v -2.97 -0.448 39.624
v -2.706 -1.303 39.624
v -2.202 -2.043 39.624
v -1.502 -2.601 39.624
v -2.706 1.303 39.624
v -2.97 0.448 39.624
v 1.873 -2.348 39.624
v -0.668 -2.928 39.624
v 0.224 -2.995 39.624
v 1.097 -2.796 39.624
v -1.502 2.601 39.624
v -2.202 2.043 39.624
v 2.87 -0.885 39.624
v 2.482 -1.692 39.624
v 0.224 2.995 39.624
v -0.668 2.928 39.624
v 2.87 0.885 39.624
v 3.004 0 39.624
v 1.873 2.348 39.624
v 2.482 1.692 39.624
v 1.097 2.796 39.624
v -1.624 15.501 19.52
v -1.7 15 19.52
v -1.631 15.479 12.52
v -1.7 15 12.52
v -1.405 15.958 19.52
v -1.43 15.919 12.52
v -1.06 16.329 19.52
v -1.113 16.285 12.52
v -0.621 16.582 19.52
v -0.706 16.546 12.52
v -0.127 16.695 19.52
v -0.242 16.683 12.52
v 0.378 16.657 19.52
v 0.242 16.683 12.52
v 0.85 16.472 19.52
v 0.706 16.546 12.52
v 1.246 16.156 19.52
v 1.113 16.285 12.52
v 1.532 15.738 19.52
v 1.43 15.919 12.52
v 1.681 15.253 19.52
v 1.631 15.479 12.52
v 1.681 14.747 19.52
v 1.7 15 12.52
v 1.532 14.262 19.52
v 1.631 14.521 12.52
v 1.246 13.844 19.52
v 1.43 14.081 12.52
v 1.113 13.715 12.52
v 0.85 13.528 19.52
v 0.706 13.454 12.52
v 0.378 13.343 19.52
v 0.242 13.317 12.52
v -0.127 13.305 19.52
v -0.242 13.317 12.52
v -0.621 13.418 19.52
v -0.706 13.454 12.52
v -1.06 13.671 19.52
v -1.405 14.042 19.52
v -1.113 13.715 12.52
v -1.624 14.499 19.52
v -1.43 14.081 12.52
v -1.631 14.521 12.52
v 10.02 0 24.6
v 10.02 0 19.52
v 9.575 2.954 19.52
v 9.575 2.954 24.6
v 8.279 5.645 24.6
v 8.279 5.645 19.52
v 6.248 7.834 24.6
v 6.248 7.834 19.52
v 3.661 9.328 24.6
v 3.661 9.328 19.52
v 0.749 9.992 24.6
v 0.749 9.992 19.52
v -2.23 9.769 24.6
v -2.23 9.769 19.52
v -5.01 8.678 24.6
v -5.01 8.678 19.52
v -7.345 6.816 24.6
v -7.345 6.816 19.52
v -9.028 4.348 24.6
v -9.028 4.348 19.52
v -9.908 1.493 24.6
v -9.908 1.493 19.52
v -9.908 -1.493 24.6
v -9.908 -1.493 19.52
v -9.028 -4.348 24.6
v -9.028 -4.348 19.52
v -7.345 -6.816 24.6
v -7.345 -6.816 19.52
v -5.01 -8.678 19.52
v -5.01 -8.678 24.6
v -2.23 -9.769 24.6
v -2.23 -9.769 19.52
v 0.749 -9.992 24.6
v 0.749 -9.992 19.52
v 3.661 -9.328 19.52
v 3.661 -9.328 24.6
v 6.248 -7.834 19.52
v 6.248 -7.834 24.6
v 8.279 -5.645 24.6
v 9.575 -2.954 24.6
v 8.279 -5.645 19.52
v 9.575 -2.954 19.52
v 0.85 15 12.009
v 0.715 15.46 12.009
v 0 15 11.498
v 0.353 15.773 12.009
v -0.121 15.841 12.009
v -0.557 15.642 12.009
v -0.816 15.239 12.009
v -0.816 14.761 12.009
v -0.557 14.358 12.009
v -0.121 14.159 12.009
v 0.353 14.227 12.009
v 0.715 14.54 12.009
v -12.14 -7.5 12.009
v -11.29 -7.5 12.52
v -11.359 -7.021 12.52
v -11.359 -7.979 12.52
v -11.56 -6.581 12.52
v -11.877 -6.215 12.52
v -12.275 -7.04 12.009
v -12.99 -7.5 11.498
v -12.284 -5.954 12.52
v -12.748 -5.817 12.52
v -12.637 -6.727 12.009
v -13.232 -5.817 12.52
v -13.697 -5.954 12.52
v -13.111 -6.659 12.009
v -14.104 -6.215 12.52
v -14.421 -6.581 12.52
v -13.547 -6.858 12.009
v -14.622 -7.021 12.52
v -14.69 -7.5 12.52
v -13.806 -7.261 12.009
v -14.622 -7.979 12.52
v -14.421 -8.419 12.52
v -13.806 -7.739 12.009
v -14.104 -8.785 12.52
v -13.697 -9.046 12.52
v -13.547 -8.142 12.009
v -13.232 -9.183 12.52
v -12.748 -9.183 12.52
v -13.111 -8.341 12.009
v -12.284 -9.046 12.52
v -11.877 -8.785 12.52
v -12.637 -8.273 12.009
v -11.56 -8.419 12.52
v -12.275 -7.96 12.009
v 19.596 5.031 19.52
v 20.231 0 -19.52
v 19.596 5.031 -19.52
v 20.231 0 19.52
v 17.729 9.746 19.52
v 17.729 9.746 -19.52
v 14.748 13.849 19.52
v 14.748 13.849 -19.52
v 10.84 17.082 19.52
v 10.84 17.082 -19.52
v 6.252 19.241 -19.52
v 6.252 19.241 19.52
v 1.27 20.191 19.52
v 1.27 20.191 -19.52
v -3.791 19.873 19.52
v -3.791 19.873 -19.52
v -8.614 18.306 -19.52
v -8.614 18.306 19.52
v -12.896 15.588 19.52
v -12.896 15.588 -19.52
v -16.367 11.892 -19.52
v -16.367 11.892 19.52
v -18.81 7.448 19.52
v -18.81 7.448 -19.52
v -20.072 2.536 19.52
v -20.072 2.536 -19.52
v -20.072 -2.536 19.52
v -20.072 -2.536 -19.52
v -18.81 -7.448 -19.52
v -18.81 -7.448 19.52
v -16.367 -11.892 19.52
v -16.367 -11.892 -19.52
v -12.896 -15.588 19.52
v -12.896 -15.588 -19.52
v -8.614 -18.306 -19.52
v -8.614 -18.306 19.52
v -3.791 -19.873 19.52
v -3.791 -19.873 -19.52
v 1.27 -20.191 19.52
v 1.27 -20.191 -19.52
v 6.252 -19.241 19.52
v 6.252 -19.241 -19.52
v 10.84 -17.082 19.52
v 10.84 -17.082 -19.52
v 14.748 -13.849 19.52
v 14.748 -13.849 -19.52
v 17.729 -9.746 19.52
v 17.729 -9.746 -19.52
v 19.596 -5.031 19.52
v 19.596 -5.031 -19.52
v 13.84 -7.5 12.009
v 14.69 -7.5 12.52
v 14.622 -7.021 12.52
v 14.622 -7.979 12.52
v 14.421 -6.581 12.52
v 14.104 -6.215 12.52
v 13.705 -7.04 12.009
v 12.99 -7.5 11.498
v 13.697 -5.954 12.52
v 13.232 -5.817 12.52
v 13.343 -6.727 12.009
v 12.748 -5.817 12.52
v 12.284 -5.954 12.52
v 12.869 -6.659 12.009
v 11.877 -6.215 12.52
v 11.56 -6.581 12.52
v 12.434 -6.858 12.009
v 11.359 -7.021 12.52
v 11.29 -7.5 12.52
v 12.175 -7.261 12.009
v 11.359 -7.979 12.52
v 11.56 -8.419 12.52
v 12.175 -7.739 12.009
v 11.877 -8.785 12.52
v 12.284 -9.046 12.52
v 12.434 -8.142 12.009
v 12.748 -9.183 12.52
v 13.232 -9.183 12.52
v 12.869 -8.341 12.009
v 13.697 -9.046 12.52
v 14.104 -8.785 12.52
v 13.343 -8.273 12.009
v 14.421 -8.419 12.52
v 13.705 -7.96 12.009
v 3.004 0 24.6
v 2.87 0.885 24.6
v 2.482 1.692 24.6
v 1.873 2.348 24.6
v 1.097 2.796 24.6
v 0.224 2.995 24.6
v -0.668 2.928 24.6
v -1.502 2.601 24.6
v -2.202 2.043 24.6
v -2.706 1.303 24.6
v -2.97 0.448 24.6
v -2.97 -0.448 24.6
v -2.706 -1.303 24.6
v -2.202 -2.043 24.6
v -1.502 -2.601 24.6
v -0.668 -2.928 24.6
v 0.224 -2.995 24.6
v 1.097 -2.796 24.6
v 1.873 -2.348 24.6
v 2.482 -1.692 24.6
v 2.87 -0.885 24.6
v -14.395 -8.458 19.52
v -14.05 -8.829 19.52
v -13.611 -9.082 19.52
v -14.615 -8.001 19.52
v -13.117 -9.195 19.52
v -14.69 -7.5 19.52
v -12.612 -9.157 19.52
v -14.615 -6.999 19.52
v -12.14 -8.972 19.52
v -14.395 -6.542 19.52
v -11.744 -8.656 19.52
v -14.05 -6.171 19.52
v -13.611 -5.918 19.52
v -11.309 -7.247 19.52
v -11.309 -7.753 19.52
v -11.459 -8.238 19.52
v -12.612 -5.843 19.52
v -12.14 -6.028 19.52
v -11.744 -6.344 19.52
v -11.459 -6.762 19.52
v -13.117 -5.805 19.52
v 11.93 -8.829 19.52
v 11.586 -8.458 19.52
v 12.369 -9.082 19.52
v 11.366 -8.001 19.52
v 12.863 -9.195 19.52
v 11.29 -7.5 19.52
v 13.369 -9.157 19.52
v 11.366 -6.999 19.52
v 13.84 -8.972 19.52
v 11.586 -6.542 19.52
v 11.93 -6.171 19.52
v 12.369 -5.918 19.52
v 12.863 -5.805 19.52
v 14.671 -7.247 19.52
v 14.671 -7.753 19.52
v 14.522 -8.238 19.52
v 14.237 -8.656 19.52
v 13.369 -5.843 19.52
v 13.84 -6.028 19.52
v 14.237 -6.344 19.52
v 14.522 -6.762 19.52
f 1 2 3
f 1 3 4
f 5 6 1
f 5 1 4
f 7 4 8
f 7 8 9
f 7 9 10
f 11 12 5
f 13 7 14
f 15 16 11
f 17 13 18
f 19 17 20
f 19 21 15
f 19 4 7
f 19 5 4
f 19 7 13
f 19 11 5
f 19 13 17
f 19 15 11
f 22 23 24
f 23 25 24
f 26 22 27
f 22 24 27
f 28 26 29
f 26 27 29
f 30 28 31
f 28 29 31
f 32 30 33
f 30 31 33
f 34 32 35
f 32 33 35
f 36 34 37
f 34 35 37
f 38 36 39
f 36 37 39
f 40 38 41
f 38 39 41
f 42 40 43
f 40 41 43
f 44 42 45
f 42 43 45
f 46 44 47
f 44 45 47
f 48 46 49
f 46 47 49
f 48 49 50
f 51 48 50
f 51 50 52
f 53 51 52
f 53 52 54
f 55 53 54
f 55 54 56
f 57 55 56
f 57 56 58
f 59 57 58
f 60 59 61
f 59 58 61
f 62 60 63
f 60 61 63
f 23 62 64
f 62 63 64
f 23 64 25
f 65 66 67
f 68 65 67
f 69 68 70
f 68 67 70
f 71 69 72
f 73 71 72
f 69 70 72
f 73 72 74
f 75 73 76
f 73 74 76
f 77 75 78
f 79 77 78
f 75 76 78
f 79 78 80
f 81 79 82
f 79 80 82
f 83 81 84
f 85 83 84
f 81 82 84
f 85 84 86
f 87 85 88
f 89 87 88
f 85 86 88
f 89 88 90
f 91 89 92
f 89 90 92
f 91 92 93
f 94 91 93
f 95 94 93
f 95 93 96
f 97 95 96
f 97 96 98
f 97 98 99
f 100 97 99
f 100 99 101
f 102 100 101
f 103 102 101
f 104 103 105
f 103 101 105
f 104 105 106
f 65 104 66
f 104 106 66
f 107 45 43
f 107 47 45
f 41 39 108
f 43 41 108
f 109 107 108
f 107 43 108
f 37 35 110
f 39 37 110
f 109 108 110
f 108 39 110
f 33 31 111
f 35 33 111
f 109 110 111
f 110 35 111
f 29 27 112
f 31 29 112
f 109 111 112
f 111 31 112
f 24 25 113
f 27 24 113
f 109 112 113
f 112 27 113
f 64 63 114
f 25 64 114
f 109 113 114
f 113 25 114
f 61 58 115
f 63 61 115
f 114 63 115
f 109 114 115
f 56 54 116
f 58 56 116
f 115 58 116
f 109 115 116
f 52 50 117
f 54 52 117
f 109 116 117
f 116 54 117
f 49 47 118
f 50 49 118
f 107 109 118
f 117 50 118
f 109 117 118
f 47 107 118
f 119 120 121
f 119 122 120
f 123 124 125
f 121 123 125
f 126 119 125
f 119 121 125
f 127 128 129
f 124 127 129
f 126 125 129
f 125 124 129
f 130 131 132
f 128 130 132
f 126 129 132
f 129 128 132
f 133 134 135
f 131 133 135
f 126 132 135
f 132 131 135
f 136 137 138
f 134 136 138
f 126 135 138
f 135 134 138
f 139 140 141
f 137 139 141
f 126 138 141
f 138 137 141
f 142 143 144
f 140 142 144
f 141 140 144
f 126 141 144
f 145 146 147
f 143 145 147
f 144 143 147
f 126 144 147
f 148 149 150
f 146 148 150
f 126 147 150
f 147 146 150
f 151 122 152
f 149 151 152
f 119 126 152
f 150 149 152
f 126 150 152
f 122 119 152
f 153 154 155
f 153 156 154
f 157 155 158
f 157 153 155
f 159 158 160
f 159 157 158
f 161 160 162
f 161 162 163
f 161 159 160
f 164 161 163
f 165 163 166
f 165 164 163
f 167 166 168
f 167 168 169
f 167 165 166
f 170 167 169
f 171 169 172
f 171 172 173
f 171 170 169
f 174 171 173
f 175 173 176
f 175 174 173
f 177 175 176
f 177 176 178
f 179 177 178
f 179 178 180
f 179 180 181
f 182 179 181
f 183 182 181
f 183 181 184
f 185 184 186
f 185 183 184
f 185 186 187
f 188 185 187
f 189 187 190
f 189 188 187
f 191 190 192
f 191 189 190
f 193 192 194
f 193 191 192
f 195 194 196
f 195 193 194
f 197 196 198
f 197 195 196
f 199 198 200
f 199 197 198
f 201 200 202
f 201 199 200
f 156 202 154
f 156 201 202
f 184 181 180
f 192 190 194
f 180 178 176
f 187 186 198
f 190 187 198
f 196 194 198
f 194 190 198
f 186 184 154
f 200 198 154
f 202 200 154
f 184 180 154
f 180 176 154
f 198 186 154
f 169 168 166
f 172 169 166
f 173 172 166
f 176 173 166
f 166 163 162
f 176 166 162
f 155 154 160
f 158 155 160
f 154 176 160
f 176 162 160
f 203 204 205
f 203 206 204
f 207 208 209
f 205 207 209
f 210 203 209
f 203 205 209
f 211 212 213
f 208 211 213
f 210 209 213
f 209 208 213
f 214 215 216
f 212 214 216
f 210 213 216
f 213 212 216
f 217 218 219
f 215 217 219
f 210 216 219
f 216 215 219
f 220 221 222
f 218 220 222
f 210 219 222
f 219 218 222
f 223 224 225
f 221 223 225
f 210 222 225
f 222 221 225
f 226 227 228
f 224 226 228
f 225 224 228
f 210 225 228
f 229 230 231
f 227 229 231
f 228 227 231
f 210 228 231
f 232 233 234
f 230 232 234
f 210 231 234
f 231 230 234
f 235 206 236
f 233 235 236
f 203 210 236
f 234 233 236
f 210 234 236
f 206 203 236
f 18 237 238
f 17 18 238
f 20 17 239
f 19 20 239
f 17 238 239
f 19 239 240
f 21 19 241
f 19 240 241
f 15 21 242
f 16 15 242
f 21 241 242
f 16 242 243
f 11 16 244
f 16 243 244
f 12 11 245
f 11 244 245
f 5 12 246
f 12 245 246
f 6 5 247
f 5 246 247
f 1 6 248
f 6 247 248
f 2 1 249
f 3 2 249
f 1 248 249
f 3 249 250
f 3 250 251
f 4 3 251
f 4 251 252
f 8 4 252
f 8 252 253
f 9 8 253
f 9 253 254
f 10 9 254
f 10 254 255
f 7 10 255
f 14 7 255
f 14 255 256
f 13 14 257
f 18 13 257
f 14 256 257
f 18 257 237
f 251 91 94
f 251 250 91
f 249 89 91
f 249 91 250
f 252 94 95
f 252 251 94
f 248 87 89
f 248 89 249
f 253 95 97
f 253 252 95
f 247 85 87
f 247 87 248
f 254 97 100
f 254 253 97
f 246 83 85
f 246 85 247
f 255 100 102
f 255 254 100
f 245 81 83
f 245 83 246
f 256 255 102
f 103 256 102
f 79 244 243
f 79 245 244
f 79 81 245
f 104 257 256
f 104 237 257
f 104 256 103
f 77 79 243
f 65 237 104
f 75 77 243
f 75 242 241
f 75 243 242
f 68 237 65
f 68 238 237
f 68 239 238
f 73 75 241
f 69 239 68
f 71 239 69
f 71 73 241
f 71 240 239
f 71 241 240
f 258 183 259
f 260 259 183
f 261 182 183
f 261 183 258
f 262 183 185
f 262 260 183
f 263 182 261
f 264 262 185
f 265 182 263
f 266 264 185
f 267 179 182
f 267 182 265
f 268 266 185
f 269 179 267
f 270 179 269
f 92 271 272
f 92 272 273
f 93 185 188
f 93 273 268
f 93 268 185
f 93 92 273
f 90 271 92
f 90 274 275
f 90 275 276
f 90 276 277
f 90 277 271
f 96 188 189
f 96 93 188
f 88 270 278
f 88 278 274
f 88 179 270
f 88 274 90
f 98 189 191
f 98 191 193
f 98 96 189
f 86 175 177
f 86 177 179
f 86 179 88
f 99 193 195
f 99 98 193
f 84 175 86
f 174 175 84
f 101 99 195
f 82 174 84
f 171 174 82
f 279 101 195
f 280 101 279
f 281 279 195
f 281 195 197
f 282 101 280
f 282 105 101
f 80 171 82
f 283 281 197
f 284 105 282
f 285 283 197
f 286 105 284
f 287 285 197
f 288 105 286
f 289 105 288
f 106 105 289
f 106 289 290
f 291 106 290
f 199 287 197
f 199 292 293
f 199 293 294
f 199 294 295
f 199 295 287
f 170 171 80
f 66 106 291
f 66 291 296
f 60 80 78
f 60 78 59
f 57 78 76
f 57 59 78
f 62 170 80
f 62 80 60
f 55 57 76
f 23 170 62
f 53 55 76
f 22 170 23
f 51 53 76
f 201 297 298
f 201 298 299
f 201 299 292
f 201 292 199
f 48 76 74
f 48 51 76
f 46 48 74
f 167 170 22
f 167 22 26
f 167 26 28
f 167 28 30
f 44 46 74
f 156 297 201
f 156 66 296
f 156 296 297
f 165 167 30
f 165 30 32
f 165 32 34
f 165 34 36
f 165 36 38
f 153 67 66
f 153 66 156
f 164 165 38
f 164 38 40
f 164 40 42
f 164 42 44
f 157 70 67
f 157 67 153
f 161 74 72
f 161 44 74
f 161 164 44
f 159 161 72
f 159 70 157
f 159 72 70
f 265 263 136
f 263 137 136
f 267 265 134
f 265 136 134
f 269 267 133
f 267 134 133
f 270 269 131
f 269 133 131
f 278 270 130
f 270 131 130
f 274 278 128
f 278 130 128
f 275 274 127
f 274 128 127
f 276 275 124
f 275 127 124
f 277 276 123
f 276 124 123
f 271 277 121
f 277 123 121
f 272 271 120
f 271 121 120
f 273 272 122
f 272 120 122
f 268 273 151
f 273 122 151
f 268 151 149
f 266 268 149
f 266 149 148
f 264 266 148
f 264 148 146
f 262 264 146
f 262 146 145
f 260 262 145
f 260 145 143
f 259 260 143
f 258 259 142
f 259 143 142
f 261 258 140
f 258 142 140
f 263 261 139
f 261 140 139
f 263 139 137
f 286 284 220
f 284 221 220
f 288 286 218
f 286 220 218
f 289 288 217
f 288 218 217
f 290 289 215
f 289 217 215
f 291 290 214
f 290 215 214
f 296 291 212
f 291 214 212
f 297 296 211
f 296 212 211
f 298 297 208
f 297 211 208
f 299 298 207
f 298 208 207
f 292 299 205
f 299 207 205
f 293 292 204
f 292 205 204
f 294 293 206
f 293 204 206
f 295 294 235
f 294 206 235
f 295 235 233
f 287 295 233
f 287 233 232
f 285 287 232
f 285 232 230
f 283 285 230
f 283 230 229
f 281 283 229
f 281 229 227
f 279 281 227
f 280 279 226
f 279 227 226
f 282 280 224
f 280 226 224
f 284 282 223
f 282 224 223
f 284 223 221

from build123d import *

# Parameters (mm, degrees)
SKETCH1_R                = 20.2311
BOSS_EXTRUDE1_DEPTH      = 19.5199
SKETCH2_R                = 10.0203
BOSS_EXTRUDE2_DEPTH      = 5.08
SKETCH3_R                = 3.00355
BOSS_EXTRUDE3_DEPTH      = 15.0241
M3_CLEARANCE_HOLE1_D     = 3.4
M3_CLEARANCE_HOLE1_DEPTH = 7.0000114
M3_CLEARANCE_HOLE1_TIP   = 1.021463052


with BuildPart() as part:
    # Sketch1 → Boss-Extrude1 (new, symmetric)
    with BuildSketch(Plane.XY):
        Circle(SKETCH1_R)
    extrude(amount=BOSS_EXTRUDE1_DEPTH, both=True)

    # Sketch2 → Boss-Extrude2 (add)
    with BuildSketch(Plane.XY.offset(19.5199)):
        Circle(SKETCH2_R)
    extrude(amount=BOSS_EXTRUDE2_DEPTH)

    # Sketch3 → Boss-Extrude3 (add)
    with BuildSketch(Plane.XY.offset(24.5999)):
        Circle(SKETCH3_R)
    extrude(amount=BOSS_EXTRUDE3_DEPTH)

    # M3 Clearance Hole1
    with Locations(Plane.XY.offset(19.5199)):
        with Locations((0, 15), (12.990381057, -7.5), (-12.990381057, -7.5)):
            Hole(M3_CLEARANCE_HOLE1_D / 2, depth=M3_CLEARANCE_HOLE1_DEPTH)
            with Locations((0, 0, -(M3_CLEARANCE_HOLE1_DEPTH + M3_CLEARANCE_HOLE1_TIP / 2))):  # 118° drill point
                Cone(0, M3_CLEARANCE_HOLE1_D / 2, M3_CLEARANCE_HOLE1_TIP, mode=Mode.SUBTRACT)


solid = part.part
